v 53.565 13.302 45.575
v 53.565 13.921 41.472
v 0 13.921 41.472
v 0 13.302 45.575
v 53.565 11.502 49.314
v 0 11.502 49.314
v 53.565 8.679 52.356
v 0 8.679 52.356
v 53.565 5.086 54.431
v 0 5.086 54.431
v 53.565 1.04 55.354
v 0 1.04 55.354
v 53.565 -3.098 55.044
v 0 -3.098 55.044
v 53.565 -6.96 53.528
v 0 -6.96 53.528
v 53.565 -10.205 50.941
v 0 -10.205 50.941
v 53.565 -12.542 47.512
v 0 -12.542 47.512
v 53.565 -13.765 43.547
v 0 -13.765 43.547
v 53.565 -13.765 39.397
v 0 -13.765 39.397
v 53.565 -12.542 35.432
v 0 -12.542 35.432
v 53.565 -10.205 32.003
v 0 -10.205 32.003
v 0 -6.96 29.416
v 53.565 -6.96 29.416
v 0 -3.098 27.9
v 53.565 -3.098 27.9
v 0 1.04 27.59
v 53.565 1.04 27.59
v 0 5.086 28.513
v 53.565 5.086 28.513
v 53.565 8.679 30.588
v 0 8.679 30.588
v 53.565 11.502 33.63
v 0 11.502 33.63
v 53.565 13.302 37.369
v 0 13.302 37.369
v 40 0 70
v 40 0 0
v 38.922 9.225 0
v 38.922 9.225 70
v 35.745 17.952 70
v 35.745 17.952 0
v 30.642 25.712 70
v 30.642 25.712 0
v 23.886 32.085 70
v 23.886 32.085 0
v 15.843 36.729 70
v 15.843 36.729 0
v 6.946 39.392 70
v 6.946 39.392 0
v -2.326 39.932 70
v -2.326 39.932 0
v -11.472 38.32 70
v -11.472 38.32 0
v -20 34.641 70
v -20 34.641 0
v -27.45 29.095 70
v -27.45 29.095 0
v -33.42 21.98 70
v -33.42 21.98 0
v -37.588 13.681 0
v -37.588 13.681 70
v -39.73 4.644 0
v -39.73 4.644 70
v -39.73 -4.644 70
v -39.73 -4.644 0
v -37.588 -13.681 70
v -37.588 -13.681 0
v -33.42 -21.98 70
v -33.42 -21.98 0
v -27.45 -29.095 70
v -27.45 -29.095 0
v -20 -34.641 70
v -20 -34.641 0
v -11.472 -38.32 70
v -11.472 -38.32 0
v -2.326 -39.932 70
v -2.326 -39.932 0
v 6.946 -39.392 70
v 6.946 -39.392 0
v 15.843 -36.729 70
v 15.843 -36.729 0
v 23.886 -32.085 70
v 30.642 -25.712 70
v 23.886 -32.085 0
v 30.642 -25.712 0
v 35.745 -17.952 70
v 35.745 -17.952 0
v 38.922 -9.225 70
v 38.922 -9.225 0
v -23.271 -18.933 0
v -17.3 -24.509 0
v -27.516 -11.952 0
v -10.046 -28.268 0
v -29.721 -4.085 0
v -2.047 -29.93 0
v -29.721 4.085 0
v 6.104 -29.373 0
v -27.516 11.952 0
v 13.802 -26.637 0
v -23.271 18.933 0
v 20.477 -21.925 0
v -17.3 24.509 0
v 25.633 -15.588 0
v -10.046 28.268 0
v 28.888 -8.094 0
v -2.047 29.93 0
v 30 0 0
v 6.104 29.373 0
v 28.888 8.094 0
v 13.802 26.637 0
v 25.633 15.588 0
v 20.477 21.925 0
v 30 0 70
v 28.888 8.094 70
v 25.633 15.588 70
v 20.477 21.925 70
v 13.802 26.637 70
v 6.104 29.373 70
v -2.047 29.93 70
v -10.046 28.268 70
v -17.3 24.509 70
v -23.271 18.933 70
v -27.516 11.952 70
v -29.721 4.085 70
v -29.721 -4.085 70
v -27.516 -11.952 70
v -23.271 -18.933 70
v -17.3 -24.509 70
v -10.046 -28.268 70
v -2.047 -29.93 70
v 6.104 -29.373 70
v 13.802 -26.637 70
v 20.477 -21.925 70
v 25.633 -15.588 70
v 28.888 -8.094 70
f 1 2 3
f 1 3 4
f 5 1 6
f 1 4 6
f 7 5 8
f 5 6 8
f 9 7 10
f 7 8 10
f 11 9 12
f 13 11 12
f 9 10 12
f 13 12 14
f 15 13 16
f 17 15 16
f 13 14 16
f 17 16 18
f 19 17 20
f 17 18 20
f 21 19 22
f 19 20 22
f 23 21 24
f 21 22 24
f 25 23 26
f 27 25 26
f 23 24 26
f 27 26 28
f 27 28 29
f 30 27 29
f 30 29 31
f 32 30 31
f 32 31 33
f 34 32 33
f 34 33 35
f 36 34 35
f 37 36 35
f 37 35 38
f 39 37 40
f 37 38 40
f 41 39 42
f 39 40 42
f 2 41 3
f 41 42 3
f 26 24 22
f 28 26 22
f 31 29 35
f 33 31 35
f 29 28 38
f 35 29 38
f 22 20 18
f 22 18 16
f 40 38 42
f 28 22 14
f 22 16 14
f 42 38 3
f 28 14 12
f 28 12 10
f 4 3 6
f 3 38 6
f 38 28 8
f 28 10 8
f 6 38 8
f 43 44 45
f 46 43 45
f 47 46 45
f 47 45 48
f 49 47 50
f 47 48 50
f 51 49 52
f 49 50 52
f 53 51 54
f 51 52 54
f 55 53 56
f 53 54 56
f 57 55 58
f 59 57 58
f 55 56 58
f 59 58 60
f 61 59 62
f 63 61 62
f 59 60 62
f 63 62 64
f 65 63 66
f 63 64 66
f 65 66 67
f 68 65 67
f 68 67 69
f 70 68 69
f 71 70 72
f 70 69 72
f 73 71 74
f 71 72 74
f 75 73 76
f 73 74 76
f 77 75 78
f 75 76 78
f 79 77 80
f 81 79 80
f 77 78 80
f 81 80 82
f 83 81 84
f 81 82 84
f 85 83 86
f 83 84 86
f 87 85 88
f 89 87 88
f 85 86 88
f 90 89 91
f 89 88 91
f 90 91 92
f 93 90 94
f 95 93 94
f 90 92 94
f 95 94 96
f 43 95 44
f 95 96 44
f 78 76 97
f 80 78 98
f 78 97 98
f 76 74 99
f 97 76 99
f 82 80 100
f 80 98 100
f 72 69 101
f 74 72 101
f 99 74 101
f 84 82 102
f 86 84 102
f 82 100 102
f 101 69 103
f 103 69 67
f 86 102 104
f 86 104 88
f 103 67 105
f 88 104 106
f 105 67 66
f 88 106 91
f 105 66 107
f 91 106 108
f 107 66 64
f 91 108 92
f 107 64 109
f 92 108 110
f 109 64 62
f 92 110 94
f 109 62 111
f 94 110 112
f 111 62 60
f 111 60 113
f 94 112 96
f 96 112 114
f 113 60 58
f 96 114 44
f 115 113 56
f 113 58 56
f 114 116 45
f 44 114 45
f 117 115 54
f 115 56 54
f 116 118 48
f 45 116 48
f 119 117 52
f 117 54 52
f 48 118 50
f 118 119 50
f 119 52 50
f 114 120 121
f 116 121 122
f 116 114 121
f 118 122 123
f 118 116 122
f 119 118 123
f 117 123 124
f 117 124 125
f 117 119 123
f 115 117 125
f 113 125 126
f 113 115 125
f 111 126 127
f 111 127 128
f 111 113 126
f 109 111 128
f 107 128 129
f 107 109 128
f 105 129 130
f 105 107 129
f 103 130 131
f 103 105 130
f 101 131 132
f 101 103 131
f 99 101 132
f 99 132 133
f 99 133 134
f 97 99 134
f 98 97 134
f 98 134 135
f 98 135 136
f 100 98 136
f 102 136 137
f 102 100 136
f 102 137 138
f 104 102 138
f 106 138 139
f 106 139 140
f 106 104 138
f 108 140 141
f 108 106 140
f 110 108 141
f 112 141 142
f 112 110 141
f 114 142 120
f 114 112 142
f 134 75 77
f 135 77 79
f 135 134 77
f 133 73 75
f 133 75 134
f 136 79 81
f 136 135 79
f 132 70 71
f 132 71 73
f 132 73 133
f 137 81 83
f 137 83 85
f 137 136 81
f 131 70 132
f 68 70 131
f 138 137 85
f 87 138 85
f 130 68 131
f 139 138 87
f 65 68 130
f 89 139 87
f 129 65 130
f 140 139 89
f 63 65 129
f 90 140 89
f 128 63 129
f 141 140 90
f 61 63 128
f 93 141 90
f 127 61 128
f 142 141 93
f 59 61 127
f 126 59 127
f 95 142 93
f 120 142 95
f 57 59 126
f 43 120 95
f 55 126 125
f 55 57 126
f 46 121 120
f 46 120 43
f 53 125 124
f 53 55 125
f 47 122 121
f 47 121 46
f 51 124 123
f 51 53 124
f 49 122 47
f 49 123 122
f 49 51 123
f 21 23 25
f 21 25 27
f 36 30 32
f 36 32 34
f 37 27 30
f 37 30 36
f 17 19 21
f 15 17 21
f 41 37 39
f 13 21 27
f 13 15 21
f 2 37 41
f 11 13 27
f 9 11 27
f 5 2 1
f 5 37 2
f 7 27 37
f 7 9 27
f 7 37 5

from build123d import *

# Parameters (mm, degrees)
F0_R     = 40
F0_R_2   = 30
F1_DEPTH = 70
F2_R     = 13.920833
F3_DEPTH = 53.5646


with BuildPart() as f1:
    # F0 (on Top) → F1 (new body)
    with BuildSketch(Plane.XY):
        Circle(F0_R)
        Circle(F0_R_2, mode=Mode.SUBTRACT)
    extrude(amount=F1_DEPTH)


with BuildPart() as f3:
    # F2 (on Right) → F3 (new body)
    with BuildSketch(Plane.YZ):
        with Locations((0, 41.472025)):
            Circle(F2_R)
    extrude(amount=F3_DEPTH)


solid = Compound([f1.part, f3.part])
